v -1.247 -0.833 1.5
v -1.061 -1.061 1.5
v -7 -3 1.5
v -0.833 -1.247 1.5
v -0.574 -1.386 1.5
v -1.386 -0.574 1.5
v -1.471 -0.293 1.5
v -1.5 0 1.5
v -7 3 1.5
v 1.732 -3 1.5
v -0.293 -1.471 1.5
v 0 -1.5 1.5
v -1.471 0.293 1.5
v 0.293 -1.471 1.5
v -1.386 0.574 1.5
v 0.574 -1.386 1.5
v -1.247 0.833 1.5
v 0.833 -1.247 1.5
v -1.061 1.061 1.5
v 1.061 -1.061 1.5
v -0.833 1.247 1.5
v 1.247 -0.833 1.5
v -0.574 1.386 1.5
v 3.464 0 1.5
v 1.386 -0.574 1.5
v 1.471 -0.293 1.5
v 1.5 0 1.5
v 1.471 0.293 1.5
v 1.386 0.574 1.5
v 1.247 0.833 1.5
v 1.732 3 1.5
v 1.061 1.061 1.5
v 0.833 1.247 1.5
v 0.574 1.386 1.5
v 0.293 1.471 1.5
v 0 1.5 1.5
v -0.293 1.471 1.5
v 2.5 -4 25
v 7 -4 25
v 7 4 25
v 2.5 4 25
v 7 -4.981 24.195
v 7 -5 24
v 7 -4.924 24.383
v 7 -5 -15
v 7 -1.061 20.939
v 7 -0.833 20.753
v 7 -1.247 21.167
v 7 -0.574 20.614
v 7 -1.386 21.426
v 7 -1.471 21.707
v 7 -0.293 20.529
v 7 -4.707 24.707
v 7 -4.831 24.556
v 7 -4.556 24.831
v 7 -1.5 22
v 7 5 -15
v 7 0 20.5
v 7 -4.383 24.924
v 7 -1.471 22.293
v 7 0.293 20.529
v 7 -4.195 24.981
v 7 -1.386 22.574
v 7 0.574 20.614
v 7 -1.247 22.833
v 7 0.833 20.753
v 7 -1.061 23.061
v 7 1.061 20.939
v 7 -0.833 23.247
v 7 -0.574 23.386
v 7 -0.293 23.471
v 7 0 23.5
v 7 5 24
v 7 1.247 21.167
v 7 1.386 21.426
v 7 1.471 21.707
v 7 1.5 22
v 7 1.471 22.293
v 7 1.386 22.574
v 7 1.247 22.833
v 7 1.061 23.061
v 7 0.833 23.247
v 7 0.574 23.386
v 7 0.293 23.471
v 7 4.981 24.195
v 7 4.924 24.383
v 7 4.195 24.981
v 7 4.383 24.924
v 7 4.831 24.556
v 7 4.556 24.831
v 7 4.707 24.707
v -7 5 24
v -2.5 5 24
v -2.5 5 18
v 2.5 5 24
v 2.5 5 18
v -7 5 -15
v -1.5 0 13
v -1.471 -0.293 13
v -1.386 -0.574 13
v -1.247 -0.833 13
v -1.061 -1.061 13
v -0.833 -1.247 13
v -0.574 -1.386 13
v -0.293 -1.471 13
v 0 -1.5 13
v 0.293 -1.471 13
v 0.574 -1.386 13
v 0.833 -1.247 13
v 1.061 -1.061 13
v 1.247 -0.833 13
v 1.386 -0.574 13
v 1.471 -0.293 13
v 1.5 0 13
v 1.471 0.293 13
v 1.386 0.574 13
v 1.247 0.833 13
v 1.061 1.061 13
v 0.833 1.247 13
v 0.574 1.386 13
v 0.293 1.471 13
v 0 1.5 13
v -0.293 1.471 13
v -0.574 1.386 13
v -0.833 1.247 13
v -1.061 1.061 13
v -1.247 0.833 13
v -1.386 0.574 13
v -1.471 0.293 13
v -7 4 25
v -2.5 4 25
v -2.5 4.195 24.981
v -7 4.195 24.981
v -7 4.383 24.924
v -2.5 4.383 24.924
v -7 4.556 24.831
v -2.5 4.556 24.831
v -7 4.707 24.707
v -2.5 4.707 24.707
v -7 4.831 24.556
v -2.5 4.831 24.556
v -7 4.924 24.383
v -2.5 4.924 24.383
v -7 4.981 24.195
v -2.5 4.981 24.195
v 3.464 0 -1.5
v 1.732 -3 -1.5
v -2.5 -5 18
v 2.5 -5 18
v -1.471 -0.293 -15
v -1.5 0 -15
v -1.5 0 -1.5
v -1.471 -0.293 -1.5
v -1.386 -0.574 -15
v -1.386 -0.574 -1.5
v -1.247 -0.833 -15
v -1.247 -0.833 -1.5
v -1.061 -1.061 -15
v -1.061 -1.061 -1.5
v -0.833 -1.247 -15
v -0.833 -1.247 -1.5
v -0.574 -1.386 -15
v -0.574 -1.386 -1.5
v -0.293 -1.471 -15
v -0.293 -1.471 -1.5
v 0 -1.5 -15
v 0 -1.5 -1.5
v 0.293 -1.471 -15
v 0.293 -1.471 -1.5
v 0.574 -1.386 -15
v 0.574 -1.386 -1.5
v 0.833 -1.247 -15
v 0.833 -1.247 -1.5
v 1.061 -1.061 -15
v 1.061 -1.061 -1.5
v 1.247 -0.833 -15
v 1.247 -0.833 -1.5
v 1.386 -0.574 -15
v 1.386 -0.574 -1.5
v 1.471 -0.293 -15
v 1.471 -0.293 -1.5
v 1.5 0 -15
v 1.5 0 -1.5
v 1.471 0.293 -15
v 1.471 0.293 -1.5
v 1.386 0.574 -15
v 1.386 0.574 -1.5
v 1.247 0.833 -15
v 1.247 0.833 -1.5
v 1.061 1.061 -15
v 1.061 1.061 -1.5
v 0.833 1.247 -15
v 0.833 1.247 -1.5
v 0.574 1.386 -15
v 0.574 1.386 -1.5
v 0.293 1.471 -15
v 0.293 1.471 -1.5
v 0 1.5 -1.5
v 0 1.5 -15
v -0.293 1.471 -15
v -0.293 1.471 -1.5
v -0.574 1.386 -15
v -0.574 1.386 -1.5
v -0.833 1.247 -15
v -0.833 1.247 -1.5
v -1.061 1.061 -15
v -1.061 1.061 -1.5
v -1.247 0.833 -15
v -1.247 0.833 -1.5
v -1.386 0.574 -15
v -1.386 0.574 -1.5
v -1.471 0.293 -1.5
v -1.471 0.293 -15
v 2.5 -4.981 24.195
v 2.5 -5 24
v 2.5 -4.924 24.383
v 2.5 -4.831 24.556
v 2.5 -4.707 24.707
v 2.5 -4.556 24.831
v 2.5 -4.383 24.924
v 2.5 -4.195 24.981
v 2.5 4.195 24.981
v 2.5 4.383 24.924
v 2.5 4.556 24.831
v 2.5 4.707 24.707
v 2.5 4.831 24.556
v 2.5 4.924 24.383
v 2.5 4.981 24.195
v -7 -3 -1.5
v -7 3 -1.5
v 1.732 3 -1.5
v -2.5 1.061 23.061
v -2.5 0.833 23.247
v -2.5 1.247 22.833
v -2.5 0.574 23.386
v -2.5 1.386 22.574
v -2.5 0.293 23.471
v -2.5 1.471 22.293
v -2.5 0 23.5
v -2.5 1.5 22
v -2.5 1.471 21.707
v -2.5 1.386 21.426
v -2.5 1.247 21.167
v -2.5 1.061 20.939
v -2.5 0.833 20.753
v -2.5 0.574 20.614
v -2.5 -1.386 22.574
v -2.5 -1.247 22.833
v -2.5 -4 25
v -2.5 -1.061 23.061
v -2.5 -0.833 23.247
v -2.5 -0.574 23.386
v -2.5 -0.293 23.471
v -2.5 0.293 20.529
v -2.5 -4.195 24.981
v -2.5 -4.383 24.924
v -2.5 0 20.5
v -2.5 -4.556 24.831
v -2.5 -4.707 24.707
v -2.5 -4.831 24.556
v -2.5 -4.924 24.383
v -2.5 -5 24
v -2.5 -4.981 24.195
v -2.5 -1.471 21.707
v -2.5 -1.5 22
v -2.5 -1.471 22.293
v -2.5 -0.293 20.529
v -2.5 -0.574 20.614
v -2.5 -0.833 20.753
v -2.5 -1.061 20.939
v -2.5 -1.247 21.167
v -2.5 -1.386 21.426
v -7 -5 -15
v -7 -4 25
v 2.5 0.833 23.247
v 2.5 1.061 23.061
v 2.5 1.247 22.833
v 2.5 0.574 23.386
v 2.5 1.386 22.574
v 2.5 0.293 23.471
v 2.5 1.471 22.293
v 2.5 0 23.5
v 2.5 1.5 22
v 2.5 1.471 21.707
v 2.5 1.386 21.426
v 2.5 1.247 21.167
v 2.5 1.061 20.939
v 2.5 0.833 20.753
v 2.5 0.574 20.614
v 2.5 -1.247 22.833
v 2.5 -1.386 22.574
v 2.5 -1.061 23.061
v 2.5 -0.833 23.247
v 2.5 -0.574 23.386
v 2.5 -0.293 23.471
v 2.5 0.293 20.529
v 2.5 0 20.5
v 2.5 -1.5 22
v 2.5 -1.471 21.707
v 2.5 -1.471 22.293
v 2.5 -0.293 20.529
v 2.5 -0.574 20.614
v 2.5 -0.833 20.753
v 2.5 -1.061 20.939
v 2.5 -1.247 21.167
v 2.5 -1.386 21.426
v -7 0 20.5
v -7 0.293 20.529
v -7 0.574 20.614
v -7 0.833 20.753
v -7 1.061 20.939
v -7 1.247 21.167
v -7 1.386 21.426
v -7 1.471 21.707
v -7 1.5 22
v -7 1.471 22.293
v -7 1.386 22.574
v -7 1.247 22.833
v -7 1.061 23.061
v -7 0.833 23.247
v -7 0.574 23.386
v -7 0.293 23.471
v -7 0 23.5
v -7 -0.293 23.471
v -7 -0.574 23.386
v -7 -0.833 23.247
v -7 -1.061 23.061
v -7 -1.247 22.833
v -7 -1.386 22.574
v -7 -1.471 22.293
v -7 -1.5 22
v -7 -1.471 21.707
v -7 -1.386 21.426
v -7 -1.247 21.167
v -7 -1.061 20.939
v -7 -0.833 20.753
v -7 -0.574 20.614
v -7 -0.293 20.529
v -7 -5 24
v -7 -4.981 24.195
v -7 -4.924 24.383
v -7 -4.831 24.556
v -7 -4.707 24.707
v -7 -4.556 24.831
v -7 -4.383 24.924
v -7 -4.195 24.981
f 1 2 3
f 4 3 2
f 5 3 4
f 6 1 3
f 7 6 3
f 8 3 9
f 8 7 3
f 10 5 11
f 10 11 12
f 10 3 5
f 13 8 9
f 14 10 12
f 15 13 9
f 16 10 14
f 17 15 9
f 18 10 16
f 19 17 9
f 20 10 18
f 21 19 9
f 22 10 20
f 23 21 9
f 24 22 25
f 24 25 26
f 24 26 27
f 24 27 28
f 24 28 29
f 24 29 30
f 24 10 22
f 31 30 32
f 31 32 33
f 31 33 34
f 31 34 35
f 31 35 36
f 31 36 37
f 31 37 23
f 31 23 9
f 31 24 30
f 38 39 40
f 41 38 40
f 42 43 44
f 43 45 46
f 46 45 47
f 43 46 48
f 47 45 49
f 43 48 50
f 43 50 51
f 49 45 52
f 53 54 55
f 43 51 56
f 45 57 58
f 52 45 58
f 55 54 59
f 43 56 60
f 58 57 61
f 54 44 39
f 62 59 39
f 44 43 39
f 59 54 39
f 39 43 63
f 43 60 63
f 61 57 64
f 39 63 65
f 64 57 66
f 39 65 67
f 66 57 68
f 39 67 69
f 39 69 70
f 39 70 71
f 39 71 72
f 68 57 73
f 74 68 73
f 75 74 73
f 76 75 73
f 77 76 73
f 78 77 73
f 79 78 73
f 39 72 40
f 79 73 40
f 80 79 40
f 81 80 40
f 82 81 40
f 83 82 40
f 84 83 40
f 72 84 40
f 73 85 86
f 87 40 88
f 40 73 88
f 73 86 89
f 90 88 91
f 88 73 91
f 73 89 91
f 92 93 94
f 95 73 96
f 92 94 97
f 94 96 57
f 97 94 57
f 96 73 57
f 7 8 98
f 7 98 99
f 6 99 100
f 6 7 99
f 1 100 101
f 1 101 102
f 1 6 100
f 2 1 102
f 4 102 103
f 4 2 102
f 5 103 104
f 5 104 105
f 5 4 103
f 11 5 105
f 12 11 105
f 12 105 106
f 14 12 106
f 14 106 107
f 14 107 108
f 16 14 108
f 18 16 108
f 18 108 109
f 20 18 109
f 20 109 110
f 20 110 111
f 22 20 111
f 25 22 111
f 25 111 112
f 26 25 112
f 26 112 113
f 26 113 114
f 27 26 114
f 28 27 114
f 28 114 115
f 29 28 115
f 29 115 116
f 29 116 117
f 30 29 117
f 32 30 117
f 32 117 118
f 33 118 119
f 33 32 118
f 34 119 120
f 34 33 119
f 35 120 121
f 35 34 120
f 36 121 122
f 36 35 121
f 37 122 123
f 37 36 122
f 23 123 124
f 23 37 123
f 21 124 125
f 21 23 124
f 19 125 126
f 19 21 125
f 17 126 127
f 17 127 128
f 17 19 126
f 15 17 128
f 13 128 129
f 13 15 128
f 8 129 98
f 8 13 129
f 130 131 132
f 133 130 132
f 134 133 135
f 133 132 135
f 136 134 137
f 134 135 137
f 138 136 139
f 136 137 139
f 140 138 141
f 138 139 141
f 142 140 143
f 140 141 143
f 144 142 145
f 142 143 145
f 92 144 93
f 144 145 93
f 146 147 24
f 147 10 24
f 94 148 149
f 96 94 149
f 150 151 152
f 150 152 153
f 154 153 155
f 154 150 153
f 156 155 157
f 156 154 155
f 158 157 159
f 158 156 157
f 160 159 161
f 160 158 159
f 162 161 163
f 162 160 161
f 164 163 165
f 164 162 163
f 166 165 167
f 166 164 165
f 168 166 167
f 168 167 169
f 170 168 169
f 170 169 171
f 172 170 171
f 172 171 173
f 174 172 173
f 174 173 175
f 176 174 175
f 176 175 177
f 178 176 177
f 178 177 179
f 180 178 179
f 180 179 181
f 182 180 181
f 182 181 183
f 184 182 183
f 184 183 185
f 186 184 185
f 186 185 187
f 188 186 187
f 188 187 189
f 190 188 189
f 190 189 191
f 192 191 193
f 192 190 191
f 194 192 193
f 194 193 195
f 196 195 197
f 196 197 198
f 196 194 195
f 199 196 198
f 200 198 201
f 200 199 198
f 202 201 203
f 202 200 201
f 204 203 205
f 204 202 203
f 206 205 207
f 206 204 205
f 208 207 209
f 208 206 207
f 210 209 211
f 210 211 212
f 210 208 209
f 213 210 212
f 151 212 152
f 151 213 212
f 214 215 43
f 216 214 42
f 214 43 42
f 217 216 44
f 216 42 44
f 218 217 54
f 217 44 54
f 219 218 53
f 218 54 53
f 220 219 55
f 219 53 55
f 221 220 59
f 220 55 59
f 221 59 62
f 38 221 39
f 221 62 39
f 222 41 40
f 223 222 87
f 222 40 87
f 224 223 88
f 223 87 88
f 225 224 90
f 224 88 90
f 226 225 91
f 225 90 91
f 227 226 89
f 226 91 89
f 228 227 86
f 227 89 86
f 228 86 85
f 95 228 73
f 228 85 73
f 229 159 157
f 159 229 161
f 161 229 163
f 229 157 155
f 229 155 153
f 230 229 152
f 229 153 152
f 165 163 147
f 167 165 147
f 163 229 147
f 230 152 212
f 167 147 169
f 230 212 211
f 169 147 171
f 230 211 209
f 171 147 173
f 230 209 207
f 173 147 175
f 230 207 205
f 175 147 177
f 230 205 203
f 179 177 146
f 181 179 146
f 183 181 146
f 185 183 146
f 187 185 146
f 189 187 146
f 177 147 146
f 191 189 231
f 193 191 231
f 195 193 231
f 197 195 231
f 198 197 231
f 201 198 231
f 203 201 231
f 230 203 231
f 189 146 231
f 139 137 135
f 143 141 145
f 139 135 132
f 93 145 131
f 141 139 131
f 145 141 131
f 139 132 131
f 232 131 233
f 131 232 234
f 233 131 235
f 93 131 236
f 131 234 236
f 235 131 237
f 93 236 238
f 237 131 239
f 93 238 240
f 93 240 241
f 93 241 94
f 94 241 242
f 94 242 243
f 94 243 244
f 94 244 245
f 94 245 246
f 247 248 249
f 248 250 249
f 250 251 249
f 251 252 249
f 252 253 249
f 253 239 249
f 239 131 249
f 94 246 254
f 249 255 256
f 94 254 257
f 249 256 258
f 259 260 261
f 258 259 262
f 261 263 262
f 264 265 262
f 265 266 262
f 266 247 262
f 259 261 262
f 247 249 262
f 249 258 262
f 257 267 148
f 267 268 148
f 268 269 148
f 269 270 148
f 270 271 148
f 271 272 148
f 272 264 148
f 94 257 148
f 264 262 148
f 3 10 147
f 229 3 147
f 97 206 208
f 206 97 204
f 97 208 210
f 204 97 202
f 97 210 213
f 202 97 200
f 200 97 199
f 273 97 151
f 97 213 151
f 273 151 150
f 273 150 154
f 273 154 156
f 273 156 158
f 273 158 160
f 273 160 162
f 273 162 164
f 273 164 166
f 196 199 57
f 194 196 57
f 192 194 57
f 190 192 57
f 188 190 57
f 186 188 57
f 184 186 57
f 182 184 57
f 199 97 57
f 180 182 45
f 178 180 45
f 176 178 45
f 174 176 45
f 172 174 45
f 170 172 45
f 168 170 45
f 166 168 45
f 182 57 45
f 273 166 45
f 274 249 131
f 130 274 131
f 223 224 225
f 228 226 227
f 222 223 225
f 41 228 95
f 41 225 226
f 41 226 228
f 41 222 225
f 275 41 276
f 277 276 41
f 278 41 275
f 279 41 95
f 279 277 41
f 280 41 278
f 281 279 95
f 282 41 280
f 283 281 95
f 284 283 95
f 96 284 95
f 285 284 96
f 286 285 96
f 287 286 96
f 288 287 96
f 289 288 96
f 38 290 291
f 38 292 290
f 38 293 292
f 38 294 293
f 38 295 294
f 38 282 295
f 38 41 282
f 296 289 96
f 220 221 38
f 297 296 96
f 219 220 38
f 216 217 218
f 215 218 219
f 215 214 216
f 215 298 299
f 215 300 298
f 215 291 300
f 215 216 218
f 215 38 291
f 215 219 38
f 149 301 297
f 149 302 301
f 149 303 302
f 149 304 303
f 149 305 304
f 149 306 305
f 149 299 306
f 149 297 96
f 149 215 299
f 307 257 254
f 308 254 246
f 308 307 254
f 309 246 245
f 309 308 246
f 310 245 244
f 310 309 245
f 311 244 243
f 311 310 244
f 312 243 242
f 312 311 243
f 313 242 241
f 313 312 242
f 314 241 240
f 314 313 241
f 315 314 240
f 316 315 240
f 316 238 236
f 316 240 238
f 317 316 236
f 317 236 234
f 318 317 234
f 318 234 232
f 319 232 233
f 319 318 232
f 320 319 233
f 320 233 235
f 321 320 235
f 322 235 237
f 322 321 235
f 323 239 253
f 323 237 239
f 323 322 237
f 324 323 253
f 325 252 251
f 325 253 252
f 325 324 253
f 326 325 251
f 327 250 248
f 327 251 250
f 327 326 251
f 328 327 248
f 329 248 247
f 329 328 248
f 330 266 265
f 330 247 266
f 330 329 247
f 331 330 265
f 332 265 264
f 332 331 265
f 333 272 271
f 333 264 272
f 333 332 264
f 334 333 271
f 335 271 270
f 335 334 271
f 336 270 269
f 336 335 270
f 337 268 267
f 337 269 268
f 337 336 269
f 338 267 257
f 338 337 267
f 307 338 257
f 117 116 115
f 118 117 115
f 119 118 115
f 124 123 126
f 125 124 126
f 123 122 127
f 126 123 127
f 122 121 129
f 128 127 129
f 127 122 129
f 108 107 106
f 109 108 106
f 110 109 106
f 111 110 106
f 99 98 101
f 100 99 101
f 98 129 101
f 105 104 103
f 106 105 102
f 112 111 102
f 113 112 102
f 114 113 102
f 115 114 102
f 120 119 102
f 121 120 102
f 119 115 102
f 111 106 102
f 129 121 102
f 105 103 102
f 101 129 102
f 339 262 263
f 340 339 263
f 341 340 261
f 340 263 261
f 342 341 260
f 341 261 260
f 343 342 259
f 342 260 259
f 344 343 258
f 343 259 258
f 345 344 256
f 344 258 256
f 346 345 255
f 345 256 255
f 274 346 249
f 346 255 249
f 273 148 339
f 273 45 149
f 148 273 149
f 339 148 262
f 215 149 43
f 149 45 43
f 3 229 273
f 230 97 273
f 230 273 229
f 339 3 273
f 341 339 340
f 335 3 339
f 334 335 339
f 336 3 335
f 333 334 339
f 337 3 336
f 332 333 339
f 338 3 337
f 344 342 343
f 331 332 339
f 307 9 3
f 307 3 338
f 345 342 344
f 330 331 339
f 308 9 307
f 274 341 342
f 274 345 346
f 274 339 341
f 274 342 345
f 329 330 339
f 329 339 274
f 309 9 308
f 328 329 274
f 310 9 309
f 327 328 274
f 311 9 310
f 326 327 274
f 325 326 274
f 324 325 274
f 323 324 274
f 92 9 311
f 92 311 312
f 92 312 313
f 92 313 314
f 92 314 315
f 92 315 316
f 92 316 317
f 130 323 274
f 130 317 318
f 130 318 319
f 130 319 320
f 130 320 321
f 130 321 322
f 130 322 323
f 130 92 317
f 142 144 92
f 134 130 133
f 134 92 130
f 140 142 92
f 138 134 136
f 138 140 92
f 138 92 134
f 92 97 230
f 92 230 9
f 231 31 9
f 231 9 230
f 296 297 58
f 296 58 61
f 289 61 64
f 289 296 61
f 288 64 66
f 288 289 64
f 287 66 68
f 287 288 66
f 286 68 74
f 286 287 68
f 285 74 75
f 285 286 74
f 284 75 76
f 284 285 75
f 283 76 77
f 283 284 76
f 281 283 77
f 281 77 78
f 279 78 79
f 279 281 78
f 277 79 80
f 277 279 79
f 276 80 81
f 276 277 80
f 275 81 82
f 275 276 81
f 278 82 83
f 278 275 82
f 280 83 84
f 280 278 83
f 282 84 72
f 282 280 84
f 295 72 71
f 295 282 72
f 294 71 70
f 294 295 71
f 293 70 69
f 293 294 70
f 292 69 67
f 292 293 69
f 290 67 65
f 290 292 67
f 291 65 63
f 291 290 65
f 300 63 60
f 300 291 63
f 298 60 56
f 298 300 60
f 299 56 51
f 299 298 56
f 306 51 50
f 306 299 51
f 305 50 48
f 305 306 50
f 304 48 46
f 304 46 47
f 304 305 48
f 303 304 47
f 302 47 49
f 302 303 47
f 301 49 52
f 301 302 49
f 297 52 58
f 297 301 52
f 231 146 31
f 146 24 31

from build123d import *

# Parameters (mm, degrees)
CROQUIS1_R                 = 1.5
SALIENTE_EXTRUIR1_DEPTH    = 7
CORTAR_EXTRUIR1_DEPTH      = 13
CORTAR_EXTRUIR1_DEPTH_BACK = 27.438608133
CROQUIS2_R                 = 1.5
CORTAR_EXTRUIR2_DEPTH      = 27.438608133
CORTAR_EXTRUIR2_DEPTH_BACK = 27.438608133
CROQUIS3_W                 = 5
CROQUIS3_H                 = 7
CORTAR_EXTRUIR3_DEPTH      = 1.5
CROQUIS5_W                 = 3
CROQUIS5_H                 = 6
CORTAR_EXTRUIR4_DEPTH      = 27.438608133


with BuildPart() as part:
    # Croquis1 → Saliente-Extruir1 (new, symmetric)
    with BuildSketch(Plane(origin=(0, 0, 0), x_dir=(0, 0, -1), z_dir=(1, 0, 0))):
        with BuildLine():
            Line((-24, 5), (15, 5))
            Line((15, 5), (15, -5))
            Line((15, -5), (-24, -5))
            ThreePointArc((-24, -5), (-24.707106781, -4.707106781), (-25, -4))
            Line((-25, -4), (-25, 4))
            ThreePointArc((-25, 4), (-24.707106781, 4.707106781), (-24, 5))
        make_face()
        with Locations((-22, 0)):
            Circle(CROQUIS1_R, mode=Mode.SUBTRACT)
    extrude(amount=SALIENTE_EXTRUIR1_DEPTH, both=True)

    # Croquis2 → Cortar-Extruir1 (cut, two sides: drawn at the far end of the back side and taken through both)
    with BuildSketch(Plane.XY.offset(-CORTAR_EXTRUIR1_DEPTH_BACK)):
        with Locations(Location((0, 0, 0), (0, 0, 180))):
            Circle(CROQUIS2_R)
    extrude(amount=CORTAR_EXTRUIR1_DEPTH + CORTAR_EXTRUIR1_DEPTH_BACK, mode=Mode.SUBTRACT)

    # Croquis3 → Cortar-Extruir2 (cut, two sides: drawn at the far end of the back side and taken through both)
    with BuildSketch(Plane(origin=(0, 0, 0), x_dir=(1, 0, 0), z_dir=(0, 1, 0)).offset(-CORTAR_EXTRUIR2_DEPTH_BACK)):
        with Locations((0, -21.5)):
            Rectangle(CROQUIS3_W, CROQUIS3_H)
    extrude(amount=CORTAR_EXTRUIR2_DEPTH + CORTAR_EXTRUIR2_DEPTH_BACK, mode=Mode.SUBTRACT)

    # Croquis4 → Cortar-Extruir3 (cut, symmetric)
    with BuildSketch(Plane.XY):
        Polygon((1.732050808, 3), (-1.732050808, 3), (-3.464101615, 0), (-1.732050808, -3), (1.732050808, -3), (3.464101615, 0), align=None)
    extrude(amount=CORTAR_EXTRUIR3_DEPTH, both=True, mode=Mode.SUBTRACT)

    # Croquis5 → Cortar-Extruir4 (cut, through all)
    with BuildSketch(Plane(origin=(0, 0, 0), x_dir=(0, 0, -1), z_dir=(1, 0, 0))):
        Rectangle(CROQUIS5_W, CROQUIS5_H)
    extrude(amount=-CORTAR_EXTRUIR4_DEPTH, mode=Mode.SUBTRACT)


solid = part.part
